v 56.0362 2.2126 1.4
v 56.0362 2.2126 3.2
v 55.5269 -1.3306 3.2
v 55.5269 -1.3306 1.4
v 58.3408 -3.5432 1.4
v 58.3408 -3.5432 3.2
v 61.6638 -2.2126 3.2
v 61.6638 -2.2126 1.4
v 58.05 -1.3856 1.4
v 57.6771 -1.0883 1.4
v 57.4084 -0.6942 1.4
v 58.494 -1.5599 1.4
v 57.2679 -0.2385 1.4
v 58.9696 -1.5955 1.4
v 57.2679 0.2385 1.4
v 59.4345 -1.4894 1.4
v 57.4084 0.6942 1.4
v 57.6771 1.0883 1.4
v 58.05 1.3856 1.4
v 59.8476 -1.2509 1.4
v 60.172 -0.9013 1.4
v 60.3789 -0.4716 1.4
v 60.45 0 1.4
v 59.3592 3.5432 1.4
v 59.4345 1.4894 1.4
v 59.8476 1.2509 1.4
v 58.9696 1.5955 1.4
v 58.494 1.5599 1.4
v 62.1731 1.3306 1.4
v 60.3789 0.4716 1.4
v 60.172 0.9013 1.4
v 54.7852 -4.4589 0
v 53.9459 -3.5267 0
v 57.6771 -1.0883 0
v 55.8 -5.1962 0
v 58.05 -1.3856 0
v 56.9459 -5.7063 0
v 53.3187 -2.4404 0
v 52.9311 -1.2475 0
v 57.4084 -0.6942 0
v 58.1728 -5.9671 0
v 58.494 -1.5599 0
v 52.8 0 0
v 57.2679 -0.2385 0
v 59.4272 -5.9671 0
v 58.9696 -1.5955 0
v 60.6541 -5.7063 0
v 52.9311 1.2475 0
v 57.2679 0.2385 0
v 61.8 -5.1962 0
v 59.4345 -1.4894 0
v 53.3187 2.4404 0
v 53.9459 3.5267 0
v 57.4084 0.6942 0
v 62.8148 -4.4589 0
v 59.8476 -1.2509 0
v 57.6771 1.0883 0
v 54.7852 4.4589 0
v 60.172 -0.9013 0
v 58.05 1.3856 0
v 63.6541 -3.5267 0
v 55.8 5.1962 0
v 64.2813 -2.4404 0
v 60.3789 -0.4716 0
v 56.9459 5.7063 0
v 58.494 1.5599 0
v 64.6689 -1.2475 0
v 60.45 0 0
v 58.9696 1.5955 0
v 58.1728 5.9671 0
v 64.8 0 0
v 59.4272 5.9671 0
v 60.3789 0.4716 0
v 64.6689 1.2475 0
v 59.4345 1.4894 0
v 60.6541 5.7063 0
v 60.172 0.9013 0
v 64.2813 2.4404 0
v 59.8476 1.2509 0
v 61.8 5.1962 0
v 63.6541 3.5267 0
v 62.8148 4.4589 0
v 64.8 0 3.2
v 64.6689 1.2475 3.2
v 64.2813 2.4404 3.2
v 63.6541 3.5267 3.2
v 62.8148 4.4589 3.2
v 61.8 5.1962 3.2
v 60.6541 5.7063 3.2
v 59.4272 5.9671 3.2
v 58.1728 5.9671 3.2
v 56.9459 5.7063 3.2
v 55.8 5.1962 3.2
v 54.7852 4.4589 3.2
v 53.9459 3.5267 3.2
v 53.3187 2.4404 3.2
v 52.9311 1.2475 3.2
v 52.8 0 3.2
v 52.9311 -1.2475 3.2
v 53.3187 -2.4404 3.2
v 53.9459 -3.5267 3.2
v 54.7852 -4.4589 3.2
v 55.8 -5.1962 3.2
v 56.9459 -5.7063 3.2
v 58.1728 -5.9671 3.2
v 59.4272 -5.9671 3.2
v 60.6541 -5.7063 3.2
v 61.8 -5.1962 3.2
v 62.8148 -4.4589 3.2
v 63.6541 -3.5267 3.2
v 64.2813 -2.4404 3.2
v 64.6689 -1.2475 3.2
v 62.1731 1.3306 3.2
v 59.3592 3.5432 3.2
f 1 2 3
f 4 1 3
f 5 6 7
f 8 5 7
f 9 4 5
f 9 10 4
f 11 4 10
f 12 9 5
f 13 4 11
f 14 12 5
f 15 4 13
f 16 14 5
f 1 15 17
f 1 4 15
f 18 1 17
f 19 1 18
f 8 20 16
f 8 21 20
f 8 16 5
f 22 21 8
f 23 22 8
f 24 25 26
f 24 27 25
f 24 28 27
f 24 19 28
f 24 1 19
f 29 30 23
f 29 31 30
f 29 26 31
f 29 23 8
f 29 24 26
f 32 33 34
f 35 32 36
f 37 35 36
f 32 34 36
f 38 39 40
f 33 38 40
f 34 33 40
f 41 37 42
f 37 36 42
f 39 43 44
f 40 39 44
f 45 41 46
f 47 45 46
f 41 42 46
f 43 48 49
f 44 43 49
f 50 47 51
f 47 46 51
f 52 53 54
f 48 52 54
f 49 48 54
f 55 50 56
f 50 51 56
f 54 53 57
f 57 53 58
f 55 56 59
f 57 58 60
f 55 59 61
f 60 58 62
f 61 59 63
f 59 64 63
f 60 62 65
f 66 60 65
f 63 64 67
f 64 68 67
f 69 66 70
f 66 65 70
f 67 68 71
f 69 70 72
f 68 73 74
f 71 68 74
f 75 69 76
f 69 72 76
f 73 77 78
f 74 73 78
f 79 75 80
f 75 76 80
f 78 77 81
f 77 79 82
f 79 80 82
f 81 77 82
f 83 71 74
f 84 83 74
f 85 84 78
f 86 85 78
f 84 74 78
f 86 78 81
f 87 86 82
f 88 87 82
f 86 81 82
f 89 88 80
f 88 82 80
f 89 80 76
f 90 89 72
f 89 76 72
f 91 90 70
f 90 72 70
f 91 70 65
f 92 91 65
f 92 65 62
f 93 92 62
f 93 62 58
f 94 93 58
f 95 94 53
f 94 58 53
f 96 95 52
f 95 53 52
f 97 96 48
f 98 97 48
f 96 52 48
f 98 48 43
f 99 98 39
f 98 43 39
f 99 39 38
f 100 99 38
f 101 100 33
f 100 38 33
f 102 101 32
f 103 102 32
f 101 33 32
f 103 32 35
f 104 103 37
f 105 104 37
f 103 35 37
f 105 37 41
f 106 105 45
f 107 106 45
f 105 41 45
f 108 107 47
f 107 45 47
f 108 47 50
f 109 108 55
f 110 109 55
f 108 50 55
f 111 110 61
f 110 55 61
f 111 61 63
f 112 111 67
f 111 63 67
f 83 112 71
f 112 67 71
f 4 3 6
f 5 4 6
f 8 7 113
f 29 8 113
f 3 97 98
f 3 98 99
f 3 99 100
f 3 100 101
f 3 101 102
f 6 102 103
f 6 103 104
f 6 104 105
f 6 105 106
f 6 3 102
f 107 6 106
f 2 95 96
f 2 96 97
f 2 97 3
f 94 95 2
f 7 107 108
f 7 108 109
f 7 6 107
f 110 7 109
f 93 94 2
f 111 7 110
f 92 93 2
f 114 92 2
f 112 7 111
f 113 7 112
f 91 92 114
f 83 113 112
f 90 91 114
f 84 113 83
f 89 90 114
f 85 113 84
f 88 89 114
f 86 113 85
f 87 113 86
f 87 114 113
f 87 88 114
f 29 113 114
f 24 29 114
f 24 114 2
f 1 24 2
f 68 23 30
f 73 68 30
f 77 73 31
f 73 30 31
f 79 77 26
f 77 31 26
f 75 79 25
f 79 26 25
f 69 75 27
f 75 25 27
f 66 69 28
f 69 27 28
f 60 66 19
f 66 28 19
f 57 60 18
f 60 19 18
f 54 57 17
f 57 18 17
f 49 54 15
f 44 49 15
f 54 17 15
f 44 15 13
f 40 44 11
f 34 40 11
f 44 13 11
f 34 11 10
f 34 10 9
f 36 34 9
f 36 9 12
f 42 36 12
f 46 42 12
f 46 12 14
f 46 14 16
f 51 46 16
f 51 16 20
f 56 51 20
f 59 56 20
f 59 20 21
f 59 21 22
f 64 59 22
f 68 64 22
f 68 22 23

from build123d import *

# Parameters (mm, degrees)
SKETCH1_R           = 6
BOSS_EXTRUDE1_DEPTH = 3.2
CUT_EXTRUDE1_DEPTH  = 1.8
SKETCH3_R           = 1.6
CUT_EXTRUDE2_DEPTH  = 3.8


with BuildPart() as part:
    # Sketch1 → Boss-Extrude1 (new body)
    with BuildSketch(Plane.XY):
        with Locations((58.8, 0)):
            Circle(SKETCH1_R)
    extrude(amount=BOSS_EXTRUDE1_DEPTH)

    # Sketch2 → Cut-Extrude1 (cut)
    with BuildSketch(Plane.XY.offset(3.2)):
        Polygon((59.35924592, 3.543162701), (56.036154051, 2.212601254), (55.526908131, -1.330561447), (58.34075408, -3.543162701), (61.663845949, -2.212601254), (62.173091869, 1.330561447), align=None)
    extrude(amount=-CUT_EXTRUDE1_DEPTH, mode=Mode.SUBTRACT)

    # Sketch3 → Cut-Extrude2 (cut)
    with BuildSketch(Plane.XY.offset(1.4)):
        with Locations((58.85, 0)):
            Circle(SKETCH3_R)
    extrude(amount=-CUT_EXTRUDE2_DEPTH, mode=Mode.SUBTRACT)


solid = part.part
